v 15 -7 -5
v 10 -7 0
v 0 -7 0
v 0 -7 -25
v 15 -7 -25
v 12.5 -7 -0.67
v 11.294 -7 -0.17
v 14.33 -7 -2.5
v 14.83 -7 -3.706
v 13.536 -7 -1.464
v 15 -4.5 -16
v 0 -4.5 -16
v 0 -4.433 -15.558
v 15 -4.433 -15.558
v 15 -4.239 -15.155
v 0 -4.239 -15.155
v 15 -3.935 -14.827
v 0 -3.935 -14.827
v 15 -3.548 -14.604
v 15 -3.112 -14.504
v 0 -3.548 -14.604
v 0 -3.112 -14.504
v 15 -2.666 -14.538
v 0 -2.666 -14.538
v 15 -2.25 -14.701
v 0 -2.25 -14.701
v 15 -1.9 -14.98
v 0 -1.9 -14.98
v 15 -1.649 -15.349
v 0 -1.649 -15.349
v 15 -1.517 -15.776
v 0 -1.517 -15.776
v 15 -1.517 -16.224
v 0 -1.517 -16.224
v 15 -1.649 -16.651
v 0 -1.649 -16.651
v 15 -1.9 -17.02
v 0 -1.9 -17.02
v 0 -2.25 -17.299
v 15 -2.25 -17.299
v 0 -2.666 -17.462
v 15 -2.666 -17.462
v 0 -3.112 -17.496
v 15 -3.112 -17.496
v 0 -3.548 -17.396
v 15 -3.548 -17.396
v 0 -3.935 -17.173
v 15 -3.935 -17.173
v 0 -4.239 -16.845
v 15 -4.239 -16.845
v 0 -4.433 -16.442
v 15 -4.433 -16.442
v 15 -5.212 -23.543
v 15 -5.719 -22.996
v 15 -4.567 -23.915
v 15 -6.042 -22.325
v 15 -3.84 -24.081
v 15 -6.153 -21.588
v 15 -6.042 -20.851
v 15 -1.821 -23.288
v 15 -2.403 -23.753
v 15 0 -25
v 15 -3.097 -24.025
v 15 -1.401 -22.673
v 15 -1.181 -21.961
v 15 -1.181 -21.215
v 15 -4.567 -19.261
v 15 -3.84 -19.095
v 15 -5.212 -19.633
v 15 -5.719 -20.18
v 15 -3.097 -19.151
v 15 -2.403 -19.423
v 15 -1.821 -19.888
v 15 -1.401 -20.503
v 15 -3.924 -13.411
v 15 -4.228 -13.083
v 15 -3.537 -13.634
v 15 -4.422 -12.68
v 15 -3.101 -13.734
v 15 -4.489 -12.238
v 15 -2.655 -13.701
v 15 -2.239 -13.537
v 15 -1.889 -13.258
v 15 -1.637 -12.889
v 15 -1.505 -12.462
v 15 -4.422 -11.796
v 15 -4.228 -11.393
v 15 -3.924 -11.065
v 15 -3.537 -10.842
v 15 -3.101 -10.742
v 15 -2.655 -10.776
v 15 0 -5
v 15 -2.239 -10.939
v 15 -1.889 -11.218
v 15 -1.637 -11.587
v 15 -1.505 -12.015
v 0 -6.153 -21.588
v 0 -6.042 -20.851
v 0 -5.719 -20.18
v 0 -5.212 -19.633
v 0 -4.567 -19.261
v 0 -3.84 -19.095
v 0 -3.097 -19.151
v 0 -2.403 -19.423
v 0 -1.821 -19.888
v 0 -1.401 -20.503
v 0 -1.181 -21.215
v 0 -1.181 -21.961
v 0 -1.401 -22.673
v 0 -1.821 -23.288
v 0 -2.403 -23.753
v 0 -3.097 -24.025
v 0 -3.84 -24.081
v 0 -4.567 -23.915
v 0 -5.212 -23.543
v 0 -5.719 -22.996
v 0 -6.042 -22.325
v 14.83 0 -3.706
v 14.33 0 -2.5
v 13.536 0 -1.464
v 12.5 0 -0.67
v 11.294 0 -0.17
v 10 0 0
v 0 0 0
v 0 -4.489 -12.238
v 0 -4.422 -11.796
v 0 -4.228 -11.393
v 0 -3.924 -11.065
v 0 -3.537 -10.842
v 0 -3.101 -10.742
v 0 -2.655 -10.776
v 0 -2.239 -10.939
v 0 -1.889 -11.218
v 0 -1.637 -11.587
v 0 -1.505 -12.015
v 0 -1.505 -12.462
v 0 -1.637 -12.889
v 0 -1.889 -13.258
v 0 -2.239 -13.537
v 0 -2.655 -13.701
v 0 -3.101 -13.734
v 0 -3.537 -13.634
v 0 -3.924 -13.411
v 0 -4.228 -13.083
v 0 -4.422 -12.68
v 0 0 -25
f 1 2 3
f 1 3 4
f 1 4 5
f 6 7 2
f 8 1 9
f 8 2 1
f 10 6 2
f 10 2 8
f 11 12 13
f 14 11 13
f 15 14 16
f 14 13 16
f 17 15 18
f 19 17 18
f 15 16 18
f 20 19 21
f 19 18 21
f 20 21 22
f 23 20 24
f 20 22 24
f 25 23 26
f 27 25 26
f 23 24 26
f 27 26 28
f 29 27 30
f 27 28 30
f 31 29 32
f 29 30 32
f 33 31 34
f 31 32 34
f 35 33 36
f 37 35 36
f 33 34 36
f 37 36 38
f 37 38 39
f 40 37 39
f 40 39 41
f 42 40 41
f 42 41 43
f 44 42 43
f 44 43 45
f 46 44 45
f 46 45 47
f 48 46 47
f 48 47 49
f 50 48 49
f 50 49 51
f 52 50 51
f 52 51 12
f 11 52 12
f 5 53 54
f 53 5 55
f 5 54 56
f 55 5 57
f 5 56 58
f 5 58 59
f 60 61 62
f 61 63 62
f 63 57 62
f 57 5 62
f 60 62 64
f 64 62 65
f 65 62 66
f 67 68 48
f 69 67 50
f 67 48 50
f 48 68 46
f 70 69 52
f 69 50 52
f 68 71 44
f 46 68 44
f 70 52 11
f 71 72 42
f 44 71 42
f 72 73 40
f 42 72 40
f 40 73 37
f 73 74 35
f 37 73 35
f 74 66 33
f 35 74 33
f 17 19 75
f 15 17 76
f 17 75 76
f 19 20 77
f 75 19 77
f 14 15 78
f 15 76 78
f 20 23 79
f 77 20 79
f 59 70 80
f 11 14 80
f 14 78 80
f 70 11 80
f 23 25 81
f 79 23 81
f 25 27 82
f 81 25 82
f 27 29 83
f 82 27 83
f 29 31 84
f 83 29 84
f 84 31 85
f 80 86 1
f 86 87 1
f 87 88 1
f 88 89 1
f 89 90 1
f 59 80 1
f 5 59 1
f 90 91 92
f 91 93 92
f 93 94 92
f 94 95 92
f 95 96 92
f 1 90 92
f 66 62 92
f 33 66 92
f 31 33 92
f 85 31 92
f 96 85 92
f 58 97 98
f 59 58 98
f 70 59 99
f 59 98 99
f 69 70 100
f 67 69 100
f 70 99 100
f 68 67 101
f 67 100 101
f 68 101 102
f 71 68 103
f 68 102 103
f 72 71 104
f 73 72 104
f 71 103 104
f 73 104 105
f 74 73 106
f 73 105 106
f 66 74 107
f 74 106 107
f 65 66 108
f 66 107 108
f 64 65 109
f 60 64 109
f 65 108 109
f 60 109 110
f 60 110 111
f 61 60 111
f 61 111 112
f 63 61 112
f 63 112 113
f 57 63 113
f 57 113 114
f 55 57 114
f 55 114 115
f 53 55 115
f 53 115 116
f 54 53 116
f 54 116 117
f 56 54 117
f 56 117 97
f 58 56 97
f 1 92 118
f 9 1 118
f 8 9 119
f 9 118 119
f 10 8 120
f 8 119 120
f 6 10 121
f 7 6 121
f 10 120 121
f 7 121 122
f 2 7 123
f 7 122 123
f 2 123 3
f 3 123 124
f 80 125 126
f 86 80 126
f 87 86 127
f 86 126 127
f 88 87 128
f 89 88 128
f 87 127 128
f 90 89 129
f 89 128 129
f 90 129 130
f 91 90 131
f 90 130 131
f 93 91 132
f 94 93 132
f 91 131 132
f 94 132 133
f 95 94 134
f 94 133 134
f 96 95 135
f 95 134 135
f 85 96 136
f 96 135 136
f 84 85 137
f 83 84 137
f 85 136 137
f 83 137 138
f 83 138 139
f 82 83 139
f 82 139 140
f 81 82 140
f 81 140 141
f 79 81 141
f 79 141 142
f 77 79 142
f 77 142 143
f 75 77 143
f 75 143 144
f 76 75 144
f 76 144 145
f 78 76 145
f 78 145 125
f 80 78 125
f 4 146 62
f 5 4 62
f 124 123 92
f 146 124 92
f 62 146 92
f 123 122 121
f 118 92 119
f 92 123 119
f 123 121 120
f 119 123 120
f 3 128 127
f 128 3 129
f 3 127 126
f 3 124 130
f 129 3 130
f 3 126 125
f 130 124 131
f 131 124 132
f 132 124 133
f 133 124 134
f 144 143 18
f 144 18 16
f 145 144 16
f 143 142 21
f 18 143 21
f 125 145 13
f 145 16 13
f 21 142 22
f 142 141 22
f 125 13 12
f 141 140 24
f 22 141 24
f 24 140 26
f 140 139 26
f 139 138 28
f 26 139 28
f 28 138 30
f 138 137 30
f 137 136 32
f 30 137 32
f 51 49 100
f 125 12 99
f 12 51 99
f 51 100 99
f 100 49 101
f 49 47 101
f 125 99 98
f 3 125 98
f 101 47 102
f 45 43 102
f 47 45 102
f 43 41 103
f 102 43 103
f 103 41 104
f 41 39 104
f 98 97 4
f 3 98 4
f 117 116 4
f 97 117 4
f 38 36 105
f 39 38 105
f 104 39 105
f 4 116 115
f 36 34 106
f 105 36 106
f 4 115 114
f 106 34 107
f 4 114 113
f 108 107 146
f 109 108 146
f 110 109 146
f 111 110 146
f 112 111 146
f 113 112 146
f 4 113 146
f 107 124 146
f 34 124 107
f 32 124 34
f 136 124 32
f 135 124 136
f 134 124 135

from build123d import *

# Parameters (mm, degrees)
F1_DEPTH = 7
F2_R     = 1.5
F2_R_2   = 2.5
F3_DEPTH = 20


with BuildPart() as f1:
    # F0 (on Front) → F1 (new body)
    with BuildSketch(Plane.XZ):
        with BuildLine():
            Line((10, 0), (0, 0))
            Line((0, 0), (0, -25))
            Line((0, -25), (15, -25))
            Line((15, -25), (15, -5))
            ThreePointArc((15, -5), (13.535534, -1.464466), (10, 0))
        make_face()
    extrude(amount=F1_DEPTH)

    # F2 (on face) → F3 (cut)
    with BuildSketch(Plane(origin=(0, 0, 0), x_dir=(0, -1, 0), z_dir=(-1, 0, 0))):
        with Locations((2.988549, -12.238131)):
            Circle(F2_R)
        with Locations((3, -16)):
            Circle(F2_R)
        with Locations((3.653436, -21.588029)):
            Circle(F2_R_2)
    extrude(amount=-F3_DEPTH, mode=Mode.SUBTRACT)


solid = f1.part
